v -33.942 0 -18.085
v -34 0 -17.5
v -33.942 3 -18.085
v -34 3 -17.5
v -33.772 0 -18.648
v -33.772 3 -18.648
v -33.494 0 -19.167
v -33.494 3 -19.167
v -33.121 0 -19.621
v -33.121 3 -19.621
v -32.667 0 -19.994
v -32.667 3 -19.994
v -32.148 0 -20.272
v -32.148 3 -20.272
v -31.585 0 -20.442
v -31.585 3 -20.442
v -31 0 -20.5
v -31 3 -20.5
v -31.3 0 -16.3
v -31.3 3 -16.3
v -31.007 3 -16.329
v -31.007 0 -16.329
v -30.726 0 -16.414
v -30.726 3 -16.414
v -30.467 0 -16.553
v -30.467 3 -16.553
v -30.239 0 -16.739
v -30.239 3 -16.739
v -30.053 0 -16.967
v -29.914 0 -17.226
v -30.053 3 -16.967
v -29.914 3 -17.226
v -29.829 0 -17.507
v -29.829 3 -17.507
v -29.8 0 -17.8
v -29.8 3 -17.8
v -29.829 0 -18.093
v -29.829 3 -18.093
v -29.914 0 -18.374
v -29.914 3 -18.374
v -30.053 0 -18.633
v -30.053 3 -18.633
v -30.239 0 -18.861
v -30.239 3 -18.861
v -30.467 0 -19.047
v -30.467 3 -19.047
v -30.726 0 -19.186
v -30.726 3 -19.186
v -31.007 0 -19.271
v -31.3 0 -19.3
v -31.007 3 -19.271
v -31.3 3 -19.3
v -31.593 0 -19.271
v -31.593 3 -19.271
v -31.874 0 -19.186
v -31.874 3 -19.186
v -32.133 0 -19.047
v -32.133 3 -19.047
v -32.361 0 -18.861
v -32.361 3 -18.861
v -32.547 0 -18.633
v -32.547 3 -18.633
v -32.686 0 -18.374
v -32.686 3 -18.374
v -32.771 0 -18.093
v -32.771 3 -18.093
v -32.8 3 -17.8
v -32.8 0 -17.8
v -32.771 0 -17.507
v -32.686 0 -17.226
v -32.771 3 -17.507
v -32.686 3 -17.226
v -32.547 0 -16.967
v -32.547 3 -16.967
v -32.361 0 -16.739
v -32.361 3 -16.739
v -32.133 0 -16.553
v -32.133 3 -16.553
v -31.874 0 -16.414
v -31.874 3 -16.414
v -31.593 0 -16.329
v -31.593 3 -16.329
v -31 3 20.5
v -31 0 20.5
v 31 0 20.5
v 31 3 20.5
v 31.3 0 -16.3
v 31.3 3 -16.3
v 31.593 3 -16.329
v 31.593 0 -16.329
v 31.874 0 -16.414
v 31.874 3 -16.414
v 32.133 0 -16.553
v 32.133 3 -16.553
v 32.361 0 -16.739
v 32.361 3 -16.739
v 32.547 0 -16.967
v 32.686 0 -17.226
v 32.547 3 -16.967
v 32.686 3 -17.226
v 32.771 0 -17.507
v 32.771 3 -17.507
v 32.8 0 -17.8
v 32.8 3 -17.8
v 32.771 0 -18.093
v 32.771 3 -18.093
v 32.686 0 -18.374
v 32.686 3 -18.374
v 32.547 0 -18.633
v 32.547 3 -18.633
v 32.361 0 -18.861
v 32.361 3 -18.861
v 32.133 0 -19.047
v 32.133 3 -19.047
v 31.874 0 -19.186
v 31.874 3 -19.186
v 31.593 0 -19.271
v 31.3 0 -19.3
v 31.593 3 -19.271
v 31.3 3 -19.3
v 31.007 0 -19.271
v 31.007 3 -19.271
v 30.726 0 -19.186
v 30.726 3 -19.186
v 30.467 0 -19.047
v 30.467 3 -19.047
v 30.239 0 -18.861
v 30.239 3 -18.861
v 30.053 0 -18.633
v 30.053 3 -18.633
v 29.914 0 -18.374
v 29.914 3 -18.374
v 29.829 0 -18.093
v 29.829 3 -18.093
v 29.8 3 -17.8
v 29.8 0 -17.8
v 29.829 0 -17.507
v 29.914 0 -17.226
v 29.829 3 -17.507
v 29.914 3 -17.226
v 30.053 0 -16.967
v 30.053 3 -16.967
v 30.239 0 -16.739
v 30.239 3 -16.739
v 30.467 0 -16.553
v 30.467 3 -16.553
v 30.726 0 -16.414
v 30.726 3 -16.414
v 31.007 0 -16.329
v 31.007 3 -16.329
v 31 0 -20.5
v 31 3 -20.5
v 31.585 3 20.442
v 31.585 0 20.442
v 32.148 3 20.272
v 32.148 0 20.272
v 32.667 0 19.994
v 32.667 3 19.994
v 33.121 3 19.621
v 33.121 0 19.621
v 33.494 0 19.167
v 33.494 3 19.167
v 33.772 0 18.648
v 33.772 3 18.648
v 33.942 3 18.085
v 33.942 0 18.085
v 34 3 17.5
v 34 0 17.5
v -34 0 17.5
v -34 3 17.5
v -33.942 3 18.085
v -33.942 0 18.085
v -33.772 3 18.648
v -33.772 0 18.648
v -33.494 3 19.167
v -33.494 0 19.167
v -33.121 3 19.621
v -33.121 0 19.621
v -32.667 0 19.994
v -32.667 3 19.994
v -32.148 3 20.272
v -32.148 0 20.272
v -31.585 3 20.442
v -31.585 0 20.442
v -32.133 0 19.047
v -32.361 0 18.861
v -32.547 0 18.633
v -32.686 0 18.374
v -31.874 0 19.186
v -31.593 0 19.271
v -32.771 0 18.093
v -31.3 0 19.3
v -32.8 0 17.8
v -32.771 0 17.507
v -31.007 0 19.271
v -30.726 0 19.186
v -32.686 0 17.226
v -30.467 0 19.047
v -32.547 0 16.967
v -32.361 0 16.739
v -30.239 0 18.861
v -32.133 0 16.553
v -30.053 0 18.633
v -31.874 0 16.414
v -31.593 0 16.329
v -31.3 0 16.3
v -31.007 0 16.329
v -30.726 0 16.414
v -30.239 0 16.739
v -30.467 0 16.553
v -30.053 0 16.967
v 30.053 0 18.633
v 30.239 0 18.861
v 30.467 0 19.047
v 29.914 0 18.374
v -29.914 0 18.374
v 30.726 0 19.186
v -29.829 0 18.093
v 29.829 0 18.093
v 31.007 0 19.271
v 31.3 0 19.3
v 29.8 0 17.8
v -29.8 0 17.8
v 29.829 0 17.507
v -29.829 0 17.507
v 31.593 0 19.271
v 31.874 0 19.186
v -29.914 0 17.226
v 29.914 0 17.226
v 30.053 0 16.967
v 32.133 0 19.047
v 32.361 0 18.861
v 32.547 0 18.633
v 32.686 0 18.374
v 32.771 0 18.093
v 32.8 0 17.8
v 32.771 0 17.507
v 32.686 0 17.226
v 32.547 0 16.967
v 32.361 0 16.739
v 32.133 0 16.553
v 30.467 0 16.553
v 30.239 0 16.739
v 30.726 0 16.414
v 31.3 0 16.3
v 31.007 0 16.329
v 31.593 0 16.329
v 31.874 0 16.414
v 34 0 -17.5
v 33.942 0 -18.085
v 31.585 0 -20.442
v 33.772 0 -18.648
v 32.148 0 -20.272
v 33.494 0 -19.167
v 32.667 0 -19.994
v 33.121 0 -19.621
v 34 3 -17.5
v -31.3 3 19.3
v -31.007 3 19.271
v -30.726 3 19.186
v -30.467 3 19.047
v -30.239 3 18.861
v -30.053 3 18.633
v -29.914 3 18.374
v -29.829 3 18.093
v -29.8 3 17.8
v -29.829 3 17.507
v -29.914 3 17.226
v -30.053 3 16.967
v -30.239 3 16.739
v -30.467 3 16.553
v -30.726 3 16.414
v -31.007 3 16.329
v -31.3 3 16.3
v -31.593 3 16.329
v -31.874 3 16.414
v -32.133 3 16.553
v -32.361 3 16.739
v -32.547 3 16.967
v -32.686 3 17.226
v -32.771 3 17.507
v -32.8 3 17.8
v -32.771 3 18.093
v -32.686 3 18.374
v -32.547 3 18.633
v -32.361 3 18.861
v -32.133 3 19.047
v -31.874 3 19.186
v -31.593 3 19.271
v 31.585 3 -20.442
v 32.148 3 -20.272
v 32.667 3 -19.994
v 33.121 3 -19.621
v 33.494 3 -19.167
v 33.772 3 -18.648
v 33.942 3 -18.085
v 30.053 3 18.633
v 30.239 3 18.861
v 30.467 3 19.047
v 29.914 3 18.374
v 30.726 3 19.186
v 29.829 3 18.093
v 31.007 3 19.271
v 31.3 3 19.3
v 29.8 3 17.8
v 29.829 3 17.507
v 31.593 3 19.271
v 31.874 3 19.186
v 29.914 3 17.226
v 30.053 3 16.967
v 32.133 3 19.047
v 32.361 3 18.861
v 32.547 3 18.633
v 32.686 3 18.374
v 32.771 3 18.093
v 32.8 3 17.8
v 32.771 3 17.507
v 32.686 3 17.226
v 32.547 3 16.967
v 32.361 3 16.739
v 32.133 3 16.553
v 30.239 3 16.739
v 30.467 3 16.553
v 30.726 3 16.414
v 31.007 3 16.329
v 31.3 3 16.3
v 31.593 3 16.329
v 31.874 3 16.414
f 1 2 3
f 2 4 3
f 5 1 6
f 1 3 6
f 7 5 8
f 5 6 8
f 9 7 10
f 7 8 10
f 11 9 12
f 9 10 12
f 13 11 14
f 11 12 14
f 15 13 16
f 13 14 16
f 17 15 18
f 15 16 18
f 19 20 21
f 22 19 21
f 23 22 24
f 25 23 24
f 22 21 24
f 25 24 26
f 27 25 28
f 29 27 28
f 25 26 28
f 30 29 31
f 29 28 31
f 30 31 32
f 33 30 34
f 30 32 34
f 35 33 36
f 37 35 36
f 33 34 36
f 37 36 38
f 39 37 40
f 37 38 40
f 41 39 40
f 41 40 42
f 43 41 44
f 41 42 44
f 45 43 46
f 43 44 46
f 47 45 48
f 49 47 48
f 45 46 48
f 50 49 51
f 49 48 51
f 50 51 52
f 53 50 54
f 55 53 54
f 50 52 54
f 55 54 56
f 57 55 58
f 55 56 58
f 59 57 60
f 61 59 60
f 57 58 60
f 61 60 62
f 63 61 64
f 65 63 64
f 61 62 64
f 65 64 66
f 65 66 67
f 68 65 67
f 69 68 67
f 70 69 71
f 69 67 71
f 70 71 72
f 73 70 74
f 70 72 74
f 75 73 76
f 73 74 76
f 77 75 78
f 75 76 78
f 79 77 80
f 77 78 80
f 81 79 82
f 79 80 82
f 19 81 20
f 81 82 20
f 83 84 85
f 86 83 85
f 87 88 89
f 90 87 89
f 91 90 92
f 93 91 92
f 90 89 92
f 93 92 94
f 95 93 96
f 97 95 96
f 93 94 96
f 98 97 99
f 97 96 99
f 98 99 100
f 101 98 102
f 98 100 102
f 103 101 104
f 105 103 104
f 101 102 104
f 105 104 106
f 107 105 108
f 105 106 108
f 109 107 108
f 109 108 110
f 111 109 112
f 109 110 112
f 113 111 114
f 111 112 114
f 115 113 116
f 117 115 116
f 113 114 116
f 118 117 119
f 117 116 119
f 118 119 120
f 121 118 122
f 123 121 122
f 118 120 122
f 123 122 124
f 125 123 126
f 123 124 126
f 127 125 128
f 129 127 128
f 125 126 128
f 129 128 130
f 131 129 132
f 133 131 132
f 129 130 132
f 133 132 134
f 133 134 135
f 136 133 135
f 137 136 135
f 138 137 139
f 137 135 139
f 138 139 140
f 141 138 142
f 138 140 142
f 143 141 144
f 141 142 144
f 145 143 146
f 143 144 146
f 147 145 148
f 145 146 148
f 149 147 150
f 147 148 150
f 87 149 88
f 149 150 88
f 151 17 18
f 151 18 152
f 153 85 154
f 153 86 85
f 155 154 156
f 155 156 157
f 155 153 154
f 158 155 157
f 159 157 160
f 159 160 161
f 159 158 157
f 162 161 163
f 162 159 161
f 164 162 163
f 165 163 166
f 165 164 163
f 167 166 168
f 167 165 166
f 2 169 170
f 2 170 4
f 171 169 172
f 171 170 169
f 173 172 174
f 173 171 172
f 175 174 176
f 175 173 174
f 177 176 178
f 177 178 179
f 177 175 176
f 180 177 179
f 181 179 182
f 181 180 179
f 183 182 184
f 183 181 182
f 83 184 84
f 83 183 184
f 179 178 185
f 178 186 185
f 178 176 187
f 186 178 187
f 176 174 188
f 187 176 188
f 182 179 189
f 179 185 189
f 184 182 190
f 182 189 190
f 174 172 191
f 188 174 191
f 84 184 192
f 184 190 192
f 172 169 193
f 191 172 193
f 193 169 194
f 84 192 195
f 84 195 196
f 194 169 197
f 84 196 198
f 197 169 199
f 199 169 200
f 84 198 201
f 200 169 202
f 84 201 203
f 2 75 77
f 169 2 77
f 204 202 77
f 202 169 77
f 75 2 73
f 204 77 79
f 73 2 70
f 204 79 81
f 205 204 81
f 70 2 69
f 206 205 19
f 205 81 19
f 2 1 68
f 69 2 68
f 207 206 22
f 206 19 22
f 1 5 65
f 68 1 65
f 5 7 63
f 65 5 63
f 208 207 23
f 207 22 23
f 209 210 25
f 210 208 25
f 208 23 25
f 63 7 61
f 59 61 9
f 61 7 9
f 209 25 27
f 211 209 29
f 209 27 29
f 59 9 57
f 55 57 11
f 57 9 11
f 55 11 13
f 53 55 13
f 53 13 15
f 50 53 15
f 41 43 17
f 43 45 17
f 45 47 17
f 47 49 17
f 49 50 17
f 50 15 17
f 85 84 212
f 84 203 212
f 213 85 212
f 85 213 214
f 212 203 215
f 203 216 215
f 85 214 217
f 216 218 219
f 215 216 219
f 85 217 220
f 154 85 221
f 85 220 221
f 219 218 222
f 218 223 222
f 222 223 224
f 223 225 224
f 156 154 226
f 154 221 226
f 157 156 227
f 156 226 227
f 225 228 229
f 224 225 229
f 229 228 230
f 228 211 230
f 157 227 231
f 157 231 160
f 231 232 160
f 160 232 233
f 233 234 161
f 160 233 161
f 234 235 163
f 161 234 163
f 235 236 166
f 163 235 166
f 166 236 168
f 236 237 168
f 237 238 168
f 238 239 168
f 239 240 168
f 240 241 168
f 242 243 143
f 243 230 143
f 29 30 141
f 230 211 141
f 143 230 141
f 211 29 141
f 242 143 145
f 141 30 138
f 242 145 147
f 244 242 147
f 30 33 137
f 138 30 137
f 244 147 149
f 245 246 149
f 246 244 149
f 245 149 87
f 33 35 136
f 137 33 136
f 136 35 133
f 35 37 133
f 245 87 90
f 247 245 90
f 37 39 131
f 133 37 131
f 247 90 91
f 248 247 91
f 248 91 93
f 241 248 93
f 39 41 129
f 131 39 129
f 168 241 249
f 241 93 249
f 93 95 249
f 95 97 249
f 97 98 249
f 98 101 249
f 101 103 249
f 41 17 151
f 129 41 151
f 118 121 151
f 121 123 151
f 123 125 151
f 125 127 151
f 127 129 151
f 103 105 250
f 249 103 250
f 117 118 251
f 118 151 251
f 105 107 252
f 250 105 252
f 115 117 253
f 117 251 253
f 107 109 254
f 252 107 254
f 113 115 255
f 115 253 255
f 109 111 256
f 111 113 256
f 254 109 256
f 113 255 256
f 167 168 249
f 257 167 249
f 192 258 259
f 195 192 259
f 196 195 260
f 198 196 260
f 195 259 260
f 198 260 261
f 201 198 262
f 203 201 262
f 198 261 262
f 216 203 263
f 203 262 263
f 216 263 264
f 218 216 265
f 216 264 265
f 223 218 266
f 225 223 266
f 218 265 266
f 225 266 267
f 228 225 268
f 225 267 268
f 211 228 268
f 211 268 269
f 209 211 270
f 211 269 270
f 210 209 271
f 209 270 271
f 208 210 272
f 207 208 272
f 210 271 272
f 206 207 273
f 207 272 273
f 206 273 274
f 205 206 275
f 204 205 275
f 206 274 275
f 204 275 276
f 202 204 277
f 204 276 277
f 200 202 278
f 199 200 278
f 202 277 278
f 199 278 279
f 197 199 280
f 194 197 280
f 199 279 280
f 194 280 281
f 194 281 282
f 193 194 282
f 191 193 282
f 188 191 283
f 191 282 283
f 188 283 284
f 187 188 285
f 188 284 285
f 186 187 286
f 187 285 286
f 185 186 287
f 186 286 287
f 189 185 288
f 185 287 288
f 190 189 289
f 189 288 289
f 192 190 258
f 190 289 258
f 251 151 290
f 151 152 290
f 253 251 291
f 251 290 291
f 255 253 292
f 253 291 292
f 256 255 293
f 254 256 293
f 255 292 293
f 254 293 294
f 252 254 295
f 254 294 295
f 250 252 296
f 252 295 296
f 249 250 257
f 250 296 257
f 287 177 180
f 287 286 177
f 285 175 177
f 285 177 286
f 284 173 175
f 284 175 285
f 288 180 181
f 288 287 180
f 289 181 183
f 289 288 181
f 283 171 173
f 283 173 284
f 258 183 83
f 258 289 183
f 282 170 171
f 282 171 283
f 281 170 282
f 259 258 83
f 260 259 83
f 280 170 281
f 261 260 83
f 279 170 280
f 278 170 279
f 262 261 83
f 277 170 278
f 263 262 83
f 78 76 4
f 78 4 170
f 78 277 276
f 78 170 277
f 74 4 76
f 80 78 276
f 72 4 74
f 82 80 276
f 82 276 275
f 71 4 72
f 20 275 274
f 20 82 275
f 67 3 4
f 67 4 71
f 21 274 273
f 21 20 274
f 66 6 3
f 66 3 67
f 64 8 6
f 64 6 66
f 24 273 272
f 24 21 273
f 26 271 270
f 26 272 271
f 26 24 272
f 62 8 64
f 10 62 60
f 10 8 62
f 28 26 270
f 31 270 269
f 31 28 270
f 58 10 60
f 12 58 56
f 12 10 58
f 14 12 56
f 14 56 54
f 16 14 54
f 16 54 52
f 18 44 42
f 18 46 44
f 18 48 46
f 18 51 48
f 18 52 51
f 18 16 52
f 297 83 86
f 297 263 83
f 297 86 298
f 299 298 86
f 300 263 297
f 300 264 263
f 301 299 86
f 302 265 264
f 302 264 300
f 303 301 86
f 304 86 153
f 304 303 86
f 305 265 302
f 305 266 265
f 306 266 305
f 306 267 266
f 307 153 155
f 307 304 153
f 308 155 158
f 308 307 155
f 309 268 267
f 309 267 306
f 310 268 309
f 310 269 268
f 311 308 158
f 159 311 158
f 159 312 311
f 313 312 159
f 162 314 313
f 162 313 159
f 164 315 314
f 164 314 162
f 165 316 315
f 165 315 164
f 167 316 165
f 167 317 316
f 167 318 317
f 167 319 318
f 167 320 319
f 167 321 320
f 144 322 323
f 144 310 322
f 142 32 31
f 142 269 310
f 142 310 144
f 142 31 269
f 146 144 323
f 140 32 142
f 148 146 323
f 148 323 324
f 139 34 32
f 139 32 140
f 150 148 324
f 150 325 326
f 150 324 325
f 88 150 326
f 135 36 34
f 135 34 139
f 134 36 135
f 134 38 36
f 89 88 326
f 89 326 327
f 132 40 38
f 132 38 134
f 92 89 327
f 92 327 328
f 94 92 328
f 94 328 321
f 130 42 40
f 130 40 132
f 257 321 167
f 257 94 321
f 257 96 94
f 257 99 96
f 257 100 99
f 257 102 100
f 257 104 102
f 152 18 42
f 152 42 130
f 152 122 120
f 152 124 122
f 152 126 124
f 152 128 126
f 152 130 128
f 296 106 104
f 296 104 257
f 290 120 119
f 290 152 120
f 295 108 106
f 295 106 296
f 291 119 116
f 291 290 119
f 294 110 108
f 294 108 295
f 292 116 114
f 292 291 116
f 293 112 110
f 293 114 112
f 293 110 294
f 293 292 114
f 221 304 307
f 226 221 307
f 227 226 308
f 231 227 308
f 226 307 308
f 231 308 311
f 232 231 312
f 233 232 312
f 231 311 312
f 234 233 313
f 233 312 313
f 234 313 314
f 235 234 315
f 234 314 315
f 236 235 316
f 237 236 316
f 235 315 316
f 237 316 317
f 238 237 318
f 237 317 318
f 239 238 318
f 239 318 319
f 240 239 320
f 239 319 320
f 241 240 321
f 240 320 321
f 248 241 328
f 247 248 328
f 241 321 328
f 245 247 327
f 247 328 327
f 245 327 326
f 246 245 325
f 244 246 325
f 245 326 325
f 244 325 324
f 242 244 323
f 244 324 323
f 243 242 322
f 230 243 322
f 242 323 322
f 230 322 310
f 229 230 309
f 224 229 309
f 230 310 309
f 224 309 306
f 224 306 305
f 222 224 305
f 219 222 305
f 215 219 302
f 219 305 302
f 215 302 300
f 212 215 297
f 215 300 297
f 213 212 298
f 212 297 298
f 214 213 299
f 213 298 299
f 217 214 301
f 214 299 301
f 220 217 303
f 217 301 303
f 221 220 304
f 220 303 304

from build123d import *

# Parameters (mm, degrees)
SKETCH_1_W          = 68
SKETCH_1_H          = 41
EXTRUDE_1_DEPTH     = 3
SKETCH_2_R          = 1.5
CUT_EXTRUDE_1_DEPTH = 3
FILLET_1_R          = 3
FILLET_2_R          = 3
FILLET_3_R          = 3
FILLET_4_R          = 3


with BuildPart() as part:
    # 草图1 → 凸台-拉伸1 (new body)
    with BuildSketch(Plane(origin=(0, 0, 0), x_dir=(1, 0, 0), z_dir=(0, 1, 0))):
        Rectangle(SKETCH_1_W, SKETCH_1_H)
    extrude(amount=EXTRUDE_1_DEPTH)

    # 草图2 → 切除-拉伸1 (cut)
    with BuildSketch(Plane(origin=(0, 3, 0), x_dir=(1, 0, 0), z_dir=(0, 1, 0))):
        with Locations(Location((31.3, 17.8, 0), (0, 0, 270))):
            Circle(SKETCH_2_R)
        with Locations(Location((-31.3, -17.8, 0), (0, 0, 270))):
            Circle(SKETCH_2_R)
        with Locations(Location((31.3, -17.8, 0), (0, 0, 270))):
            Circle(SKETCH_2_R)
        with Locations(Location((-31.3, 17.8, 0), (0, 0, 270))):
            Circle(SKETCH_2_R)
    extrude(amount=-CUT_EXTRUDE_1_DEPTH, mode=Mode.SUBTRACT)

    # 圆角1
    fillet_1_edges = [part.edges().sort_by_distance(p)[0] for p in [
        (-34, 1.5, -20.5),
    ]]
    fillet(fillet_1_edges, radius=FILLET_1_R)

    # 圆角2
    fillet_2_edges = [part.edges().sort_by_distance(p)[0] for p in [
        (34, 1.5, -20.5),
    ]]
    fillet(fillet_2_edges, radius=FILLET_2_R)

    # 圆角3
    fillet_3_edges = [part.edges().sort_by_distance(p)[0] for p in [
        (-34, 1.5, 20.5),
    ]]
    fillet(fillet_3_edges, radius=FILLET_3_R)

    # 圆角4
    fillet_4_edges = [part.edges().sort_by_distance(p)[0] for p in [
        (34, 1.5, 20.5),
    ]]
    fillet(fillet_4_edges, radius=FILLET_4_R)


solid = part.part
